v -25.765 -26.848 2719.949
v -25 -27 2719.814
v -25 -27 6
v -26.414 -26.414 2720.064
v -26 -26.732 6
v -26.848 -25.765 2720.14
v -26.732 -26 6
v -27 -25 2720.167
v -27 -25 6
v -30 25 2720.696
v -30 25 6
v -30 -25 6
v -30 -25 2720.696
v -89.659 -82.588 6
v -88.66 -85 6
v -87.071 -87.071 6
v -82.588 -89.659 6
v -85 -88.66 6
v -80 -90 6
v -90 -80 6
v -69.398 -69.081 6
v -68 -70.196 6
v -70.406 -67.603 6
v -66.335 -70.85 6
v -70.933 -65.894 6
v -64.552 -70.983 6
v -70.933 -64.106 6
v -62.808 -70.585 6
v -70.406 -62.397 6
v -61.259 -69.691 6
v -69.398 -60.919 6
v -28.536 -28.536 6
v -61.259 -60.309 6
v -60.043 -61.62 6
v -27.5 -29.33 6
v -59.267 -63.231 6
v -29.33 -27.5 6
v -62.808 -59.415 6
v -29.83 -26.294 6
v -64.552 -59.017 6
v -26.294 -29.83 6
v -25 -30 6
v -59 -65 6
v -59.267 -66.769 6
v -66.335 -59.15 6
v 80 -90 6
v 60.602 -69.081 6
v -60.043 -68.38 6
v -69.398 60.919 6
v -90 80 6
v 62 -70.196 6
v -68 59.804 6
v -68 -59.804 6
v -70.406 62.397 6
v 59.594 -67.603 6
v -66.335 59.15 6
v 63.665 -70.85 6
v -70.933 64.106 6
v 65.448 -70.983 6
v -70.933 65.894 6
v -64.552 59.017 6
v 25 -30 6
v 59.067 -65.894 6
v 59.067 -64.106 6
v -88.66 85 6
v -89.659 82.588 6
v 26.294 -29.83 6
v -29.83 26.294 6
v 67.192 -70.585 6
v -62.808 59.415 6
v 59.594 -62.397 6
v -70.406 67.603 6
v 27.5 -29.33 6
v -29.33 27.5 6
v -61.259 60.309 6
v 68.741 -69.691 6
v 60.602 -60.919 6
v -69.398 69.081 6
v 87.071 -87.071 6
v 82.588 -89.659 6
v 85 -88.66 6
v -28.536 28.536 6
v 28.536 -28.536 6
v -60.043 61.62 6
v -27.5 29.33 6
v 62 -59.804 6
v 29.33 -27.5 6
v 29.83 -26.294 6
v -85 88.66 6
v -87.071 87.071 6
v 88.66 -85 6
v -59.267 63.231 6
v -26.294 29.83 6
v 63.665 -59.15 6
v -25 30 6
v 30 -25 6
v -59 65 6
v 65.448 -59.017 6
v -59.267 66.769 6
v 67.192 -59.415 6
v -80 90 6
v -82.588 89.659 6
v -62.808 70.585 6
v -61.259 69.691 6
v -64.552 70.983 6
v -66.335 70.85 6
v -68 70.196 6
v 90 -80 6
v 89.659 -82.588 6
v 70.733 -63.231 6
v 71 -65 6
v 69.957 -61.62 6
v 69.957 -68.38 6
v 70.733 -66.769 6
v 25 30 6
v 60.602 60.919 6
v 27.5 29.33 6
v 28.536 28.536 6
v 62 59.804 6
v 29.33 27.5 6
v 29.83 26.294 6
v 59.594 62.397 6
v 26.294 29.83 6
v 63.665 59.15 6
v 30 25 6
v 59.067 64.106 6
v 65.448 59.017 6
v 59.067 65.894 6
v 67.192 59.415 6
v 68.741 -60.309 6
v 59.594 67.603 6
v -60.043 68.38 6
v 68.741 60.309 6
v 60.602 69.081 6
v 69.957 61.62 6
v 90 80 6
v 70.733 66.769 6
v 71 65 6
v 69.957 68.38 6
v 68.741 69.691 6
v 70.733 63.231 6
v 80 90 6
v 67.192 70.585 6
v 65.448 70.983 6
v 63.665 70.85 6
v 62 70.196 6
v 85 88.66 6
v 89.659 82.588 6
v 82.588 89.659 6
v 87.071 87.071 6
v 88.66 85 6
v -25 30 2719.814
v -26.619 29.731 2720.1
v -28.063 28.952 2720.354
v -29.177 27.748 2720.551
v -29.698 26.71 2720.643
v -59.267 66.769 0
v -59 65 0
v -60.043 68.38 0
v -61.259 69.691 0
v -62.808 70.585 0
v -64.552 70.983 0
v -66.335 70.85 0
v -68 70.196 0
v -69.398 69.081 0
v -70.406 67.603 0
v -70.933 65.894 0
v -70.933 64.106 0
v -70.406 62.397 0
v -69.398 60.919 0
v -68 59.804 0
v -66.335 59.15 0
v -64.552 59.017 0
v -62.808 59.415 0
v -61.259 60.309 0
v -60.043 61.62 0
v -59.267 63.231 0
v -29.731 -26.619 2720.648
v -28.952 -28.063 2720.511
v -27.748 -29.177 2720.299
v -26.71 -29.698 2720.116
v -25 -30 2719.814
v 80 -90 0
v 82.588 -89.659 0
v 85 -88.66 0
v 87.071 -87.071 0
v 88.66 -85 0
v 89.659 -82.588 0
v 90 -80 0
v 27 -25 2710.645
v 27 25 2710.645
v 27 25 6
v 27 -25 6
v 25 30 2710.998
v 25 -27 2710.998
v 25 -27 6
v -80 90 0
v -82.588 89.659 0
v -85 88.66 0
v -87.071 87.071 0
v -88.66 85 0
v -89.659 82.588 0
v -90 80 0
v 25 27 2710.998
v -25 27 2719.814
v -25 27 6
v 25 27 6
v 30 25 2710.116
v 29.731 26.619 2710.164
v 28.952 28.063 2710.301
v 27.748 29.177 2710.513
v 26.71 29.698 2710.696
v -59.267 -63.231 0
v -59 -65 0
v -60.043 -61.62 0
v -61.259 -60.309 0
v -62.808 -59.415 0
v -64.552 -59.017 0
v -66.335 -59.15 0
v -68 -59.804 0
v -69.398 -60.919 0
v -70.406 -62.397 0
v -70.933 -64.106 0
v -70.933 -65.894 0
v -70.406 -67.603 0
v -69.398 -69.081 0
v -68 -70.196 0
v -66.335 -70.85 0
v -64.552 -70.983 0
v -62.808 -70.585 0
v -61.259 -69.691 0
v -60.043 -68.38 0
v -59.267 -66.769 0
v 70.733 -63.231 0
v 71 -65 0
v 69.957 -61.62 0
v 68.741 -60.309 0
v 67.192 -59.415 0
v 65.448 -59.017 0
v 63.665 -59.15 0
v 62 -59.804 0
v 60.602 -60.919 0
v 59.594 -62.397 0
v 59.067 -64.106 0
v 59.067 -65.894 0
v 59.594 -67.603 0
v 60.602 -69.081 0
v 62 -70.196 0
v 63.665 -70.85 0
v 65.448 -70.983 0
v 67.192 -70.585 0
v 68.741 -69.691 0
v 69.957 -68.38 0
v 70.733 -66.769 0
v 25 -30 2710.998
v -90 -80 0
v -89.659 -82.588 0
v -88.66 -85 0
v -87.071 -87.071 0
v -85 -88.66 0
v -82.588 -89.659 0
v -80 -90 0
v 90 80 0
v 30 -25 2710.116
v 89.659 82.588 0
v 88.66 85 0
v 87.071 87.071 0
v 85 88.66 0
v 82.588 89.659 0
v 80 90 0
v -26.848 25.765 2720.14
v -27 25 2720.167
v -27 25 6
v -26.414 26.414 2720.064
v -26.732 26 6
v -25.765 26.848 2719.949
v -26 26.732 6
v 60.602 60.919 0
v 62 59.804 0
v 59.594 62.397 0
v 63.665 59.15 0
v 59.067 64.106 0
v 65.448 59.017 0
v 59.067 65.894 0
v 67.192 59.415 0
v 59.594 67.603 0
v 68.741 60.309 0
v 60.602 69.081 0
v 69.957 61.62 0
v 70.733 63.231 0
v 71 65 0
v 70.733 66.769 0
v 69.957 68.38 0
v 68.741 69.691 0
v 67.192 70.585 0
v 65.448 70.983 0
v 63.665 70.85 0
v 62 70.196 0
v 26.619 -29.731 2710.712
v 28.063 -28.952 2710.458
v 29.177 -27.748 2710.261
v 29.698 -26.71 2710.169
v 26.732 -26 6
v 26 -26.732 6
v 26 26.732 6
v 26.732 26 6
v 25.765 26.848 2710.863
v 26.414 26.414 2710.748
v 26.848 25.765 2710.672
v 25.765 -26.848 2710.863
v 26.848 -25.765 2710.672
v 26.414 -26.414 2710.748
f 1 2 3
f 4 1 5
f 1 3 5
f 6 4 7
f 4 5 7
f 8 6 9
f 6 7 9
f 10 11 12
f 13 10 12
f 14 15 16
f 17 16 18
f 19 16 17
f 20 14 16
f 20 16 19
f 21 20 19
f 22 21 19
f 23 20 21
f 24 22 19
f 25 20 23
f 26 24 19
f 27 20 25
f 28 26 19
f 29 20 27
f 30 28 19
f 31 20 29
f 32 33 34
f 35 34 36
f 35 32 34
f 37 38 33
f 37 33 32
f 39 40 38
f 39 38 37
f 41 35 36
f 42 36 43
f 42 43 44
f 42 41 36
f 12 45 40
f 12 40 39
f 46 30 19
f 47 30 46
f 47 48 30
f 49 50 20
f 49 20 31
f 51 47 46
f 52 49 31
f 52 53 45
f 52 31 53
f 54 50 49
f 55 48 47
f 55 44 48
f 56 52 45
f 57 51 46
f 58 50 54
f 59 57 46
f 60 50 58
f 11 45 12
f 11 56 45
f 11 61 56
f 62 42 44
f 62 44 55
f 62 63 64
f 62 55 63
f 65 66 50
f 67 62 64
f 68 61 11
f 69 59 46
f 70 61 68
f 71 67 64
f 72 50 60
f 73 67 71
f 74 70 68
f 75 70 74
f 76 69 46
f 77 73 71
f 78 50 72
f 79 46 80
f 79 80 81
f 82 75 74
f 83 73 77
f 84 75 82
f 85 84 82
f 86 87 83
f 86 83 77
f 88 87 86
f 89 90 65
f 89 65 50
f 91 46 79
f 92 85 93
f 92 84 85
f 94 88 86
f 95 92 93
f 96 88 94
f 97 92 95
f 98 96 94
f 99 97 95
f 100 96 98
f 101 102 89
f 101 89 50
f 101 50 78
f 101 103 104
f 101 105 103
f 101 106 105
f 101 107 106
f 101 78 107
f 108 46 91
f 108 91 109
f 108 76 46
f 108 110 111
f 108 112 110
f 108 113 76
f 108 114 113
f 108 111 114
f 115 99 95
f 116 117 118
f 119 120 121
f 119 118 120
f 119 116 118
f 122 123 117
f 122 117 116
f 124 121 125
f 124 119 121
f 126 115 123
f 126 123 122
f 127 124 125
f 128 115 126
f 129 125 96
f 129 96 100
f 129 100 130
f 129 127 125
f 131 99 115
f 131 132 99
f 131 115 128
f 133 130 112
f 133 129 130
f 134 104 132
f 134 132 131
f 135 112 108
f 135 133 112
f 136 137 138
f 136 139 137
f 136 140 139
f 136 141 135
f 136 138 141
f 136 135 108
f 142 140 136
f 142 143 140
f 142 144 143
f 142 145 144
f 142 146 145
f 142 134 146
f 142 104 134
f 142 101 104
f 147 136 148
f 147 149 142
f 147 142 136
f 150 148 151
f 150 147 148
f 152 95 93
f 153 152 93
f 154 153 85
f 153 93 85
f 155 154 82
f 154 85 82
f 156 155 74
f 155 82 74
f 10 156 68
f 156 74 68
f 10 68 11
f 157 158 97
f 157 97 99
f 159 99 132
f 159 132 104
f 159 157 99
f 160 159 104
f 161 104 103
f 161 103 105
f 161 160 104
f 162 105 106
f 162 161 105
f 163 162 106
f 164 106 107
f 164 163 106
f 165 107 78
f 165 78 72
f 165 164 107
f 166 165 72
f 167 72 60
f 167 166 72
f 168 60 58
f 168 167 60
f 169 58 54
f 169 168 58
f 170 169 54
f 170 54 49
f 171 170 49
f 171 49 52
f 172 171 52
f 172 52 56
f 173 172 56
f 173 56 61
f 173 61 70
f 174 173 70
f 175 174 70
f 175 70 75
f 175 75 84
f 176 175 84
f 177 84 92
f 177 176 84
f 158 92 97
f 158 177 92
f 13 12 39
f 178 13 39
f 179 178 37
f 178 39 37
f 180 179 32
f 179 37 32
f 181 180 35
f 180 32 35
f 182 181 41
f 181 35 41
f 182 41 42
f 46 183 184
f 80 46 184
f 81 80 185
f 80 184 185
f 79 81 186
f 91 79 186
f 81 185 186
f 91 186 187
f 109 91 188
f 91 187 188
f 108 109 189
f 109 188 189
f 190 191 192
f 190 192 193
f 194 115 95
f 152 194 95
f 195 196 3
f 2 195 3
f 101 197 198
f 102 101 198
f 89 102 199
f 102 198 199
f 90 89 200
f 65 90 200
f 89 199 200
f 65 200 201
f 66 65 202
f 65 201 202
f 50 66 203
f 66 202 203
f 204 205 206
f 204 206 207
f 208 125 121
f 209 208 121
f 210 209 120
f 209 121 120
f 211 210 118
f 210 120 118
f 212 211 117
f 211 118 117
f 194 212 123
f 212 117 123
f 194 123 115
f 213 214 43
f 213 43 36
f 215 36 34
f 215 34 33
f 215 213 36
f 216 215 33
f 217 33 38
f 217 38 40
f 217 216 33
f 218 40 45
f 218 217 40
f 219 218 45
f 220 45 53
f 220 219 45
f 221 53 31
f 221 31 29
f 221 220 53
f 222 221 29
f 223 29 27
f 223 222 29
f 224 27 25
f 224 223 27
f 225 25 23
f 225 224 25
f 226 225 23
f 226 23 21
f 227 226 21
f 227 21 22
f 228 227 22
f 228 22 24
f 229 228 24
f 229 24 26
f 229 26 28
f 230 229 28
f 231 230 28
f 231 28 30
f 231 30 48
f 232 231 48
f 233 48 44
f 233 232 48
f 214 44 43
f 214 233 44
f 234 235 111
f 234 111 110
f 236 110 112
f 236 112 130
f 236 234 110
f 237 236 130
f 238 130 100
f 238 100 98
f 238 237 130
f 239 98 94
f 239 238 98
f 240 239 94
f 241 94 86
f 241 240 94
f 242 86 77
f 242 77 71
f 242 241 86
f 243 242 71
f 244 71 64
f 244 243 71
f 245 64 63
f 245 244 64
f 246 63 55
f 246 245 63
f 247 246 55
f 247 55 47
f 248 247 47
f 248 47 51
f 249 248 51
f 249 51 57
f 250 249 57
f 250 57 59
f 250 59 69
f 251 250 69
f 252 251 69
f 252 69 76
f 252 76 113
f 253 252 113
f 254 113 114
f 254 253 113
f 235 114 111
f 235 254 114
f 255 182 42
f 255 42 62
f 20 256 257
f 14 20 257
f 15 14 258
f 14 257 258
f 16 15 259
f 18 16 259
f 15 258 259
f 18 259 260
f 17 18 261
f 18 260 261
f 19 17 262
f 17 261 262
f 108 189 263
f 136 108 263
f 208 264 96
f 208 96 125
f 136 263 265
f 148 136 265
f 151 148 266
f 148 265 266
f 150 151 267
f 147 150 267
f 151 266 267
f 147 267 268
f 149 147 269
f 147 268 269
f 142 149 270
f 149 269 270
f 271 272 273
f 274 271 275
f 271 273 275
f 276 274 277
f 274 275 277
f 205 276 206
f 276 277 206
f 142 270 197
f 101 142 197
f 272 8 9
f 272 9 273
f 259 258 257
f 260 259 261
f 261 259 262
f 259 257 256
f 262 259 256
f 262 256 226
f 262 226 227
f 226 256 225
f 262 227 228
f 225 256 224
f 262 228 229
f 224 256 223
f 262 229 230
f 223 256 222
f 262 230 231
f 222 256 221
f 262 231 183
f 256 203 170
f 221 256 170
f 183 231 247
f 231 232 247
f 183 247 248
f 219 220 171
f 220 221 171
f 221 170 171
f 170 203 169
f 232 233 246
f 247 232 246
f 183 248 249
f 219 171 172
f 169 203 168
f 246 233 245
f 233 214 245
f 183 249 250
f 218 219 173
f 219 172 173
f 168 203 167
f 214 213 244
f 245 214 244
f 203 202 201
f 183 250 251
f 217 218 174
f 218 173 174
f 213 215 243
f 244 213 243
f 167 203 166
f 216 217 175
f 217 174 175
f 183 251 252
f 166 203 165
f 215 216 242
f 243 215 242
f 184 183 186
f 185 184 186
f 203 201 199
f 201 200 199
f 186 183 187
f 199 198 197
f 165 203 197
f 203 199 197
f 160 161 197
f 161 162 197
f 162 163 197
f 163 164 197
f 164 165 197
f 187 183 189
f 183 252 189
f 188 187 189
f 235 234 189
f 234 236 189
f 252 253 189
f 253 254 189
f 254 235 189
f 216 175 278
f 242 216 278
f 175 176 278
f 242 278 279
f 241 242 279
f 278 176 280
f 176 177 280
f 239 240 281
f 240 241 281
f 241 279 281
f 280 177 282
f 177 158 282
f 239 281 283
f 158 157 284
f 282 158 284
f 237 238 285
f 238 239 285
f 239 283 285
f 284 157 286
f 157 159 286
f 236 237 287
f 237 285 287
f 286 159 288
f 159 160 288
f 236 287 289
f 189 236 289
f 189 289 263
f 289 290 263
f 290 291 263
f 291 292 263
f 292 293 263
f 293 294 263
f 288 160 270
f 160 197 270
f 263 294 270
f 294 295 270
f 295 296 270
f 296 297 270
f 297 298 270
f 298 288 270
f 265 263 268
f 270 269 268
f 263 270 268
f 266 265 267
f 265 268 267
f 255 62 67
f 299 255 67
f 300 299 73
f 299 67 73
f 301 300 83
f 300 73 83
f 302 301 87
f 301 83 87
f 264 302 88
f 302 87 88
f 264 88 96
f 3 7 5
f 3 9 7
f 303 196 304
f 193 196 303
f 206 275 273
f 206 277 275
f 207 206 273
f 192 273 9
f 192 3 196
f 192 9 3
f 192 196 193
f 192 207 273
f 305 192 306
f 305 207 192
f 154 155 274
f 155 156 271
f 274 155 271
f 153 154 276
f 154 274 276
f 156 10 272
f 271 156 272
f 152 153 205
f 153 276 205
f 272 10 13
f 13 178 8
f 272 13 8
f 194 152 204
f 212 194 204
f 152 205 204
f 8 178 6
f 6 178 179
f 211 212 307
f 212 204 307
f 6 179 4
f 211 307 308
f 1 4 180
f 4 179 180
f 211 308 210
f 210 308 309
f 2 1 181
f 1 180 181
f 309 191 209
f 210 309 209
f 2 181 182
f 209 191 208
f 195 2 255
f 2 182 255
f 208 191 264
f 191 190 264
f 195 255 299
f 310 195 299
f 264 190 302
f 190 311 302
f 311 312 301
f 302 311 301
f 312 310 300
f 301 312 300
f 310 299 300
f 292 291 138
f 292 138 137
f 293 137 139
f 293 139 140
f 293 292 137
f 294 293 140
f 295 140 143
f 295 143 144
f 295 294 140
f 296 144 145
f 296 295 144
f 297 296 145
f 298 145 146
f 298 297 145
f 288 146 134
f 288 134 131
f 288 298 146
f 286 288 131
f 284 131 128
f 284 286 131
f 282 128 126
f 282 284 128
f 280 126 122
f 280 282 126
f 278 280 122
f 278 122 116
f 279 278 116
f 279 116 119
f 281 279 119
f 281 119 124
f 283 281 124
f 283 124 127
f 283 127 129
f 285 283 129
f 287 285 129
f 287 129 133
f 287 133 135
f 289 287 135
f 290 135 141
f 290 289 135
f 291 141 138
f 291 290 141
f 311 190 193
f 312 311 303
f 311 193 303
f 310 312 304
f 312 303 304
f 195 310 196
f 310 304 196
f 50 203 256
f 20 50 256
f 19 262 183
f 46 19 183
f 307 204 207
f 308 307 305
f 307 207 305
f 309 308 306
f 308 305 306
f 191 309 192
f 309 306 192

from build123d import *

# Parameters (mm, degrees)
F0_R     = 6
F1_DEPTH = 6
F3_DEPTH = 2714.7
F5_DEPTH = 120.001


with BuildPart() as f1:
    # F0 (on Top) → F1 (new body)
    with BuildSketch(Plane.XY):
        with BuildLine():
            ThreePointArc((90, 80), (87.071068, 87.071068), (80, 90))
            Line((80, 90), (-80, 90))
            ThreePointArc((-80, 90), (-87.071068, 87.071068), (-90, 80))
            Line((-90, 80), (-90, -80))
            ThreePointArc((-90, -80), (-87.071068, -87.071068), (-80, -90))
            Line((-80, -90), (80, -90))
            ThreePointArc((80, -90), (87.071068, -87.071068), (90, -80))
            Line((90, -80), (90, 80))
        make_face()
        with Locations((-65, -65)):
            Circle(F0_R, mode=Mode.SUBTRACT)
        with Locations((65, -65)):
            Circle(F0_R, mode=Mode.SUBTRACT)
        with Locations((-65, 65)):
            Circle(F0_R, mode=Mode.SUBTRACT)
        with Locations((65, 65)):
            Circle(F0_R, mode=Mode.SUBTRACT)
    extrude(amount=F1_DEPTH)

    # F2 (on face) → F3 (join)
    with BuildSketch(Plane.XY.offset(6)):
        with BuildLine():
            Line((-25, -30), (25, -30))
            ThreePointArc((25, -30), (28.535534, -28.535534), (30, -25))
            Line((30, -25), (30, 25))
            ThreePointArc((30, 25), (28.535534, 28.535534), (25, 30))
            Line((25, 30), (-25, 30))
            ThreePointArc((-25, 30), (-28.535534, 28.535534), (-30, 25))
            Line((-30, 25), (-30, -25))
            ThreePointArc((-30, -25), (-28.535534, -28.535534), (-25, -30))
        make_face()
        with BuildLine():
            ThreePointArc((25, 27), (26.414214, 26.414214), (27, 25))
            Line((27, 25), (27, -25))
            ThreePointArc((27, -25), (26.414214, -26.414214), (25, -27))
            Line((25, -27), (-25, -27))
            ThreePointArc((-25, -27), (-26.414214, -26.414214), (-27, -25))
            Line((-27, -25), (-27, 25))
            ThreePointArc((-27, 25), (-26.414214, 26.414214), (-25, 27))
            Line((-25, 27), (25, 27))
        make_face(mode=Mode.SUBTRACT)
    extrude(amount=F3_DEPTH)

    # F4 (on face) → F5 (cut, through all)
    with BuildSketch(Plane.XZ.offset(30)):
        Polygon((31.369732, 2720.7), (-30.02377, 2720.7), (31.369732, 2709.874669), align=None)
    extrude(amount=-F5_DEPTH, mode=Mode.SUBTRACT)


solid = f1.part
